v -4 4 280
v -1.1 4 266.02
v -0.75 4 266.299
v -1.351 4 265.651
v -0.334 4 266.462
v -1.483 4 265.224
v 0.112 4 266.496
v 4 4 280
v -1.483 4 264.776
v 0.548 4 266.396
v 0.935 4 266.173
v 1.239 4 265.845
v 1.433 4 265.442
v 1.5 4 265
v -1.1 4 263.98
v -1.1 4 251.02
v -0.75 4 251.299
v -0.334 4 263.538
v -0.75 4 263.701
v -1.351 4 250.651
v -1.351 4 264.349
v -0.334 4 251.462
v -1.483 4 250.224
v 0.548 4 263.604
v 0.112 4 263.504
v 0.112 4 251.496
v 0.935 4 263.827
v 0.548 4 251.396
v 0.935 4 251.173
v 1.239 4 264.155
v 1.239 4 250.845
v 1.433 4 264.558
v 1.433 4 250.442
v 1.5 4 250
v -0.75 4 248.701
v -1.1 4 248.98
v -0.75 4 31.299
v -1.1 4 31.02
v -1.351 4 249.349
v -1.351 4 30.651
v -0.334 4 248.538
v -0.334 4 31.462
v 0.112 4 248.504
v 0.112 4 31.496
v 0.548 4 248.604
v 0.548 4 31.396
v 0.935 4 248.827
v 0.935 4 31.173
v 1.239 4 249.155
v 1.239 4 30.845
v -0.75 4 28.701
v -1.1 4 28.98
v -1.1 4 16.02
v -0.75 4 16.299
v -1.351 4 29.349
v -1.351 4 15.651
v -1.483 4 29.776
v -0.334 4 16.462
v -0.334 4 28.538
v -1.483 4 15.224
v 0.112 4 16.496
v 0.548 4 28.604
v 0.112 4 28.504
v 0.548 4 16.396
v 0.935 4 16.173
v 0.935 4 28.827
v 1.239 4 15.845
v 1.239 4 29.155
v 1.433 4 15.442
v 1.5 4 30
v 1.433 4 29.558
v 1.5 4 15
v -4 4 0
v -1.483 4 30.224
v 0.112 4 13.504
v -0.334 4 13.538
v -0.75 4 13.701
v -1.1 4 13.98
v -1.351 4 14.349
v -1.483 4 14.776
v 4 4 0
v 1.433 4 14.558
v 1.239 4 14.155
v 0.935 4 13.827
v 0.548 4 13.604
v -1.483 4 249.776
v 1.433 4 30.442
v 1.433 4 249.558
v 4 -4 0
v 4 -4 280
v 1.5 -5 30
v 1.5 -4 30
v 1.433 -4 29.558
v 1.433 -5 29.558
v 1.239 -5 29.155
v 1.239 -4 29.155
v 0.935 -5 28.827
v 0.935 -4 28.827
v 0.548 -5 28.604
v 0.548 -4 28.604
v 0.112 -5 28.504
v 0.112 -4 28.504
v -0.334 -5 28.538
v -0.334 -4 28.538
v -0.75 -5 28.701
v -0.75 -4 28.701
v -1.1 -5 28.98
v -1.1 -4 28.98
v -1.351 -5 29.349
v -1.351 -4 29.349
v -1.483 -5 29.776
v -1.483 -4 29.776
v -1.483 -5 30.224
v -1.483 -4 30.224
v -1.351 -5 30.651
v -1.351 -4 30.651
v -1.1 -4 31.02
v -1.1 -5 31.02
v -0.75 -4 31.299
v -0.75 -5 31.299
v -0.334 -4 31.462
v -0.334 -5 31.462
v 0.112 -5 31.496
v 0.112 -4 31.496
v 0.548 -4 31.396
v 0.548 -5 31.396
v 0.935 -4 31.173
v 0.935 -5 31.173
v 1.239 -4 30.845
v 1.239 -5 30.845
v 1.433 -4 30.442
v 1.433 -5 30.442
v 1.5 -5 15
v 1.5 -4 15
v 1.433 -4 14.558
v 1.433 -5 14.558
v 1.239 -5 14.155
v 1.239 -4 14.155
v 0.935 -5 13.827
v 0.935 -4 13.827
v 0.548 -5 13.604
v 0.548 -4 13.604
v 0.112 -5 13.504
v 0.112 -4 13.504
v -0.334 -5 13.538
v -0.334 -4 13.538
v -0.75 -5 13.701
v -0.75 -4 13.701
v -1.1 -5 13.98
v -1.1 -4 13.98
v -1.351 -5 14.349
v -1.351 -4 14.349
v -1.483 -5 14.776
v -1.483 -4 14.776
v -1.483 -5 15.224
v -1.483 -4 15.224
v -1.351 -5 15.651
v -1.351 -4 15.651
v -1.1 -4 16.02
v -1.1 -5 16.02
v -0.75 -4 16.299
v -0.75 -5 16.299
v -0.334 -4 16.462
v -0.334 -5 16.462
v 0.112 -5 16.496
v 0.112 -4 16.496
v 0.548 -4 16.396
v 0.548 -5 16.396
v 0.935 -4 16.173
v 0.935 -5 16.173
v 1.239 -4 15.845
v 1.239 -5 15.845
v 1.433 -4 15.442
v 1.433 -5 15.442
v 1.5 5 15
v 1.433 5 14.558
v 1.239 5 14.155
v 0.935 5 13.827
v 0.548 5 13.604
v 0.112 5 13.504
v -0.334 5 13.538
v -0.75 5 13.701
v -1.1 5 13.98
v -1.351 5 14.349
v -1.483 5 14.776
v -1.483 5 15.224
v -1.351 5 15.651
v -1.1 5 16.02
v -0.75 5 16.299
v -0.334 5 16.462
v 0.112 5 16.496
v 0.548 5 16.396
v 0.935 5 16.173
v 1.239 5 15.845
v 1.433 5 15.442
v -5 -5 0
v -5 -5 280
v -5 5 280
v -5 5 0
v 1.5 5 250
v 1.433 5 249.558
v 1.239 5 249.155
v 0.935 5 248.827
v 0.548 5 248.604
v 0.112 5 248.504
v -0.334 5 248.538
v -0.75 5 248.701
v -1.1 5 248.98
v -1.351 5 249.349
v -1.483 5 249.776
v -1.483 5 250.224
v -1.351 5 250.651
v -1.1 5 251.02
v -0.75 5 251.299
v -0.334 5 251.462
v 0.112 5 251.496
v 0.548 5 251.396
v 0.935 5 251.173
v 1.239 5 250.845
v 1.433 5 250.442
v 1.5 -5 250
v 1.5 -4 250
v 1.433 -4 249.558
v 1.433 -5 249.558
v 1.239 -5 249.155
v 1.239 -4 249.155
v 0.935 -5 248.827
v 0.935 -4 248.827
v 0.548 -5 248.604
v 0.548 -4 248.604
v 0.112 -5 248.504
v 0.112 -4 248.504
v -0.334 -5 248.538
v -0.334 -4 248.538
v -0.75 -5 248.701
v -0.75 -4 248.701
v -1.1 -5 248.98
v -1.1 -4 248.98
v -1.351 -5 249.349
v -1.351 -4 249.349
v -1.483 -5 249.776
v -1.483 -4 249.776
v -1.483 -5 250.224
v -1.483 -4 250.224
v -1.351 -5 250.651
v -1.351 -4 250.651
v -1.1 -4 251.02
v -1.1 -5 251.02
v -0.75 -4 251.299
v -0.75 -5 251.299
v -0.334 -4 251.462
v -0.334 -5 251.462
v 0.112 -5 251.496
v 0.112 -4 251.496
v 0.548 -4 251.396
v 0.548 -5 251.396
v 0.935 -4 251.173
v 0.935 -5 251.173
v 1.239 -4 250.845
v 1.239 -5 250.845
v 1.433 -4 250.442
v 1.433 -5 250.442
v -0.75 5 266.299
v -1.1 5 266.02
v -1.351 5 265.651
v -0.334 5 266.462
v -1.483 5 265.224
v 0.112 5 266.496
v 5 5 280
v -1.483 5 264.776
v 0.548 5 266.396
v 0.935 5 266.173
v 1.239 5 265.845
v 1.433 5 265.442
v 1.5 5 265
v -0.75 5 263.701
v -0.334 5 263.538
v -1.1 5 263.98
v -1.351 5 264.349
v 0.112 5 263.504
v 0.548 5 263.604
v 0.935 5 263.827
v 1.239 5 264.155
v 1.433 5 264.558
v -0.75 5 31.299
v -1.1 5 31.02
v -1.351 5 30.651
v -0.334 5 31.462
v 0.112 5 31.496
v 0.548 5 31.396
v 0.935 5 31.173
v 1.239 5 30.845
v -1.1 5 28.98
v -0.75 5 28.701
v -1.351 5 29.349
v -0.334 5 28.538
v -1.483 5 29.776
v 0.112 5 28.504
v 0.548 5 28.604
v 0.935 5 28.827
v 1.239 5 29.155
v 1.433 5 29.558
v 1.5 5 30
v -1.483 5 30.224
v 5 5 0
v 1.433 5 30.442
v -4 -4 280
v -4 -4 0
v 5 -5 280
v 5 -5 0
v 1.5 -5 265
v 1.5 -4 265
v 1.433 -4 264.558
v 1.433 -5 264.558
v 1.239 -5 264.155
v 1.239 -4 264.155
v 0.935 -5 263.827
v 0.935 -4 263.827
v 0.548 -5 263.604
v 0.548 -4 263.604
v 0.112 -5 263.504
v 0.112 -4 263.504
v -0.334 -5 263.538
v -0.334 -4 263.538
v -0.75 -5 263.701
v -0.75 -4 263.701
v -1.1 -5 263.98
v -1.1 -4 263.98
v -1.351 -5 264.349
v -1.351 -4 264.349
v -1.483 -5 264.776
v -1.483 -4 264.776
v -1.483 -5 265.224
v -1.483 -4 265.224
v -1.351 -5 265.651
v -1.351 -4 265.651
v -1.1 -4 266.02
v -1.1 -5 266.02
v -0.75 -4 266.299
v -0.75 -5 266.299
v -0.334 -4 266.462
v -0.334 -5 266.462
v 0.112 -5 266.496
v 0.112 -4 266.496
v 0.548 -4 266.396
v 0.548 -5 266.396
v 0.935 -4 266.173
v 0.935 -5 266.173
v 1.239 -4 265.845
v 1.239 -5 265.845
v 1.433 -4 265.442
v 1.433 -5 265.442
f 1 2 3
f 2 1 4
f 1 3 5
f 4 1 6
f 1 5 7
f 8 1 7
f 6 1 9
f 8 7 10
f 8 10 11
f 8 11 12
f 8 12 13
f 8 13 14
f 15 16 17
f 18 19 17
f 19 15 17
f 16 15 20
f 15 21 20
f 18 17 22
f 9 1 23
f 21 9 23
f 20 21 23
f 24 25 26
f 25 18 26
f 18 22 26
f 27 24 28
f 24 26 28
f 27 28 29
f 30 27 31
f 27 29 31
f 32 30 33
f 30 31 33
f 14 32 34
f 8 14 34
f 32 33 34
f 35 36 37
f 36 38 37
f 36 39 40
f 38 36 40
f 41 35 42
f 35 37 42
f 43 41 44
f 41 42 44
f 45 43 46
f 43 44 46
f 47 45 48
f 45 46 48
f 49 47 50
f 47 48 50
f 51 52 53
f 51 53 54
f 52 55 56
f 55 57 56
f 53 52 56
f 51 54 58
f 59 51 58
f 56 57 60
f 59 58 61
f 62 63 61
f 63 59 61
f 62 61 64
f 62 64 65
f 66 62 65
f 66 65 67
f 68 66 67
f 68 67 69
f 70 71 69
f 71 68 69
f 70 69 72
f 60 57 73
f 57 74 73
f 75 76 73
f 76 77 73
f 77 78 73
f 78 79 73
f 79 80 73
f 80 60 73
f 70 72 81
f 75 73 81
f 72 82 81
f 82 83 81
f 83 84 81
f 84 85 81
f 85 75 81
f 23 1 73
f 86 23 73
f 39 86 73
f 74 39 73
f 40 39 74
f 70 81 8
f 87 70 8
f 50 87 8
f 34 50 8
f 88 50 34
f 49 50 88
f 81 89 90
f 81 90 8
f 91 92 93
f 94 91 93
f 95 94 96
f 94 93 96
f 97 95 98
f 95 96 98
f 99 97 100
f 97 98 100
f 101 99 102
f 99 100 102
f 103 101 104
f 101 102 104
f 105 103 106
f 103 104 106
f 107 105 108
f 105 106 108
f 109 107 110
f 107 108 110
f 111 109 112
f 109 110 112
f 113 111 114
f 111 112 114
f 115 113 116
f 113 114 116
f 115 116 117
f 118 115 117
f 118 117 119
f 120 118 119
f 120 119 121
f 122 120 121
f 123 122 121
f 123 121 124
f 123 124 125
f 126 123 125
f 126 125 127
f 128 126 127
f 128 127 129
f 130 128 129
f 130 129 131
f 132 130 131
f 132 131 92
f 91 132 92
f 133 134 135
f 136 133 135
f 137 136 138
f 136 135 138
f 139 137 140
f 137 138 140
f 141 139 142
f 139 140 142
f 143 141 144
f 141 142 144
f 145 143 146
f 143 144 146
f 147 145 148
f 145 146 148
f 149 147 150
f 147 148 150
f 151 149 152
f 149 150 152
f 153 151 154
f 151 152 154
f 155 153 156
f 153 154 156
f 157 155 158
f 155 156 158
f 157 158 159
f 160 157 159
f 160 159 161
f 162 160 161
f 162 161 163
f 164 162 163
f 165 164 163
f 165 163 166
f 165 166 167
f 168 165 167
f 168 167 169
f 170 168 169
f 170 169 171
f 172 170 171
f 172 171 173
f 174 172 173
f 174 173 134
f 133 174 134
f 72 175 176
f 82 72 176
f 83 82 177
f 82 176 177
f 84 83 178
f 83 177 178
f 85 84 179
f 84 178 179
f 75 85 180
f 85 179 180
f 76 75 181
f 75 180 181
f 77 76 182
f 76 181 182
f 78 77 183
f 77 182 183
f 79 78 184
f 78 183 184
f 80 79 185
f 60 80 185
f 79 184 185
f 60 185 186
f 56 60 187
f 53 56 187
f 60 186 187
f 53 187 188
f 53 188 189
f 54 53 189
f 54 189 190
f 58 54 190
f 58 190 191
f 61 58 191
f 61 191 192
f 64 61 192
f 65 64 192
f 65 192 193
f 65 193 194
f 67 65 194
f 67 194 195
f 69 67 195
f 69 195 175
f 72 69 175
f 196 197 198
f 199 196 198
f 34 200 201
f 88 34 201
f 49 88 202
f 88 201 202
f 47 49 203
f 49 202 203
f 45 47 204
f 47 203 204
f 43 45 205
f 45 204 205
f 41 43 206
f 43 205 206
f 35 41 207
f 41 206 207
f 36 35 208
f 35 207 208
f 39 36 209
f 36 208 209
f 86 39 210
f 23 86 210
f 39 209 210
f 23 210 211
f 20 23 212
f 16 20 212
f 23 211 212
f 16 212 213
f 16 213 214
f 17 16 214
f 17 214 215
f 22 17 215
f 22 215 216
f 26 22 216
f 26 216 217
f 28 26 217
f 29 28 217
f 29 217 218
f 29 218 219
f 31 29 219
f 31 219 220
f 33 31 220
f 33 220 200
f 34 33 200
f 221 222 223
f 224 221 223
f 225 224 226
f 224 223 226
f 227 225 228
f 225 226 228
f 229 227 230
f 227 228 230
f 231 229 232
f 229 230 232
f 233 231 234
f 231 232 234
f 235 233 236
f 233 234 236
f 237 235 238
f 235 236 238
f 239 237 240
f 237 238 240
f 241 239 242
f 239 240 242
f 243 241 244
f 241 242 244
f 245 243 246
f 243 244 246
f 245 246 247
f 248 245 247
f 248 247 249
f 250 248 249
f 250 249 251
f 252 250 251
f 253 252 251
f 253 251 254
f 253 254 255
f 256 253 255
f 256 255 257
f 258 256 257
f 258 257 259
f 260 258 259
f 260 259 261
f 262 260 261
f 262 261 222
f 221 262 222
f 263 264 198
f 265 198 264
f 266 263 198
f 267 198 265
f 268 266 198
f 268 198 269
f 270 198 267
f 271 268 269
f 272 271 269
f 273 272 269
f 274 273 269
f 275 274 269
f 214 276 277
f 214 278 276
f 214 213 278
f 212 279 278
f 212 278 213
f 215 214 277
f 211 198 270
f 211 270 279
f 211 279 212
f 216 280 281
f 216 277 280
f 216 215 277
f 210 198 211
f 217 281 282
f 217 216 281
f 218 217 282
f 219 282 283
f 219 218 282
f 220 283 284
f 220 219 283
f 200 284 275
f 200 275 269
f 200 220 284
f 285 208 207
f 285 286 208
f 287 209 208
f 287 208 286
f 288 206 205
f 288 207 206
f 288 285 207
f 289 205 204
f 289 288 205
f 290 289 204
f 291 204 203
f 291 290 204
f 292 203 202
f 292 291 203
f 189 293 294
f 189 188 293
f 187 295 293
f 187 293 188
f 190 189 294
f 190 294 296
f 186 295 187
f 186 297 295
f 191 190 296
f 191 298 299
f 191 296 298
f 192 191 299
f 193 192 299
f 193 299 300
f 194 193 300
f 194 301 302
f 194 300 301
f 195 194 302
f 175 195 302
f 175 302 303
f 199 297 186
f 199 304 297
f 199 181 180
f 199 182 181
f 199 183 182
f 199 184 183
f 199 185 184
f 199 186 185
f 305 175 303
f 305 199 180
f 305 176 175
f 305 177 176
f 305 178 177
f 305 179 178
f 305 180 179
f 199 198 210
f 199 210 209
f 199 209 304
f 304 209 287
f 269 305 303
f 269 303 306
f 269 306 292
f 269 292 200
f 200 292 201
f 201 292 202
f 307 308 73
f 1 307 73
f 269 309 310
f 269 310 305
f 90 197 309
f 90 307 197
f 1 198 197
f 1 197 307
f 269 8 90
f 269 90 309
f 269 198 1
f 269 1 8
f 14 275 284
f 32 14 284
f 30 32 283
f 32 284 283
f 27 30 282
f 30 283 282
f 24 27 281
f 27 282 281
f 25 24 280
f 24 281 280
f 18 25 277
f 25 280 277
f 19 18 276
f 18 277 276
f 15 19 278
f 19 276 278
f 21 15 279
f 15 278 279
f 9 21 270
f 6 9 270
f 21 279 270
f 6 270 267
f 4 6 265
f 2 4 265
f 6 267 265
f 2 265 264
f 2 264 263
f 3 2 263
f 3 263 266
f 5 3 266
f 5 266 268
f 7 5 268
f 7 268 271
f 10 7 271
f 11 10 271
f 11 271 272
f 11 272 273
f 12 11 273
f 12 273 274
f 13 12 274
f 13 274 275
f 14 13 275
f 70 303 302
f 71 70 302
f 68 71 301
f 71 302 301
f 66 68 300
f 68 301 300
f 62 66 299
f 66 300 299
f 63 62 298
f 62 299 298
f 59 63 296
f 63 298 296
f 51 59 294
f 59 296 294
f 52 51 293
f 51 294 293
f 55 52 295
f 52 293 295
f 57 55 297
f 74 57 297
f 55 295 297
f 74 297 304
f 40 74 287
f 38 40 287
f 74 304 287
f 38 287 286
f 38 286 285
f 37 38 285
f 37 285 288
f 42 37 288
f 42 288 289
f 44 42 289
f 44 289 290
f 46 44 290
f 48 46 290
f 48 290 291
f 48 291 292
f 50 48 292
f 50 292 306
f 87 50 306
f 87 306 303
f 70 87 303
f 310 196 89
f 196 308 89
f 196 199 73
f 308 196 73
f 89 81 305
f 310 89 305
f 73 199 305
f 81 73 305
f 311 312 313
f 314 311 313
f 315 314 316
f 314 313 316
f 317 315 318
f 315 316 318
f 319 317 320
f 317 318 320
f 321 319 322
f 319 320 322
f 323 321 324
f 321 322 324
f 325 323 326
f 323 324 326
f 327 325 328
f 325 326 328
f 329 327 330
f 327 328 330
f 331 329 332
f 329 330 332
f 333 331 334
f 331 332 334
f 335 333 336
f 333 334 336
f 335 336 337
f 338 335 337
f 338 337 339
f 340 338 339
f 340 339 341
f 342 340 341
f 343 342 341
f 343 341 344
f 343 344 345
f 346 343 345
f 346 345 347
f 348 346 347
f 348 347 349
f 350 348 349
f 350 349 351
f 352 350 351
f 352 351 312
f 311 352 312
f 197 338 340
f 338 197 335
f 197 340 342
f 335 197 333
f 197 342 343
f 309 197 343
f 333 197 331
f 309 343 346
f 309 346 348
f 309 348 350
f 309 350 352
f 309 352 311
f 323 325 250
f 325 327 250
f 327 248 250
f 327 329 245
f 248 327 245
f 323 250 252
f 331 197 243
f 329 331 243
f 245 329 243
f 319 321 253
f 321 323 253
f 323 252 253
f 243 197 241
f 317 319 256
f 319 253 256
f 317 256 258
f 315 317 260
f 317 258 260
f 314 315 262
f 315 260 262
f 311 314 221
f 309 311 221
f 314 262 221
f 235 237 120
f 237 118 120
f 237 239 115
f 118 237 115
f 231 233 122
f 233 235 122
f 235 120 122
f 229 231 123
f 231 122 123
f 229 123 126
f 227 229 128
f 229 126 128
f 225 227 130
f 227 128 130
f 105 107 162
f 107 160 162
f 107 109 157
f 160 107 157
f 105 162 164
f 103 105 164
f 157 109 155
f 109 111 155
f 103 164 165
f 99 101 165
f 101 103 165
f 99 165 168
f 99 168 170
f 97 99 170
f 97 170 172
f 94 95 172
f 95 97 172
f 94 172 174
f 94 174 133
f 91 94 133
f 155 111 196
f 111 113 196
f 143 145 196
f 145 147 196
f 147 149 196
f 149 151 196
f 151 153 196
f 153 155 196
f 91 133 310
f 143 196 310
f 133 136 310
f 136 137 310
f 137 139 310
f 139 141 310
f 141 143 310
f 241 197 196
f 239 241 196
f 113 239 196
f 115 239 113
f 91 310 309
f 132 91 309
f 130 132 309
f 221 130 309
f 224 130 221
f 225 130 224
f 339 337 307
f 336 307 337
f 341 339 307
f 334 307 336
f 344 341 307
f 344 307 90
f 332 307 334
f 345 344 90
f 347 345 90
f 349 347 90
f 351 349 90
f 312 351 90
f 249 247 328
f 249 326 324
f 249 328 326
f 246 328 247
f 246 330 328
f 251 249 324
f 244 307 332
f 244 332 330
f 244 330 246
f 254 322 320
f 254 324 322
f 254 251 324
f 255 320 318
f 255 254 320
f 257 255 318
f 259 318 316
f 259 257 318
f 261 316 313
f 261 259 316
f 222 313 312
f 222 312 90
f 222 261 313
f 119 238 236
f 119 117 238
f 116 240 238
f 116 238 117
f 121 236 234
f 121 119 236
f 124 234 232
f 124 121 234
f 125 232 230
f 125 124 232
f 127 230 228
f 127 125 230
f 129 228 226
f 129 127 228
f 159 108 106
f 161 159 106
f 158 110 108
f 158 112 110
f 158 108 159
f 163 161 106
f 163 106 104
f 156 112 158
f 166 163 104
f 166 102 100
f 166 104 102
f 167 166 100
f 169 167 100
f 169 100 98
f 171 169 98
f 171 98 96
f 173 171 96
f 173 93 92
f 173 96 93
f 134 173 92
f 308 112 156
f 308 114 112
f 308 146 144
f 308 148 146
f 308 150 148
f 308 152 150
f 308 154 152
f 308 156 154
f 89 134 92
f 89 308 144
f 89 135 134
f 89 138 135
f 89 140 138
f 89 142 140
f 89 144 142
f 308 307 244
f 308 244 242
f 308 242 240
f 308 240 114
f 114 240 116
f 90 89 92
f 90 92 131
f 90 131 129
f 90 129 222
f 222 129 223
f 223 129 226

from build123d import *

# Parameters (mm, degrees)
SKETCH2_W           = 10
SKETCH2_H           = 10
SKETCH2_W_2         = 8
SKETCH2_H_2         = 8
BOSS_EXTRUDE1_DEPTH = 280
SKETCH3_R           = 1.5
CUT_EXTRUDE1_DEPTH  = 28


with BuildPart() as part:
    # Sketch2 → Boss-Extrude1 (new body)
    with BuildSketch(Plane.XY):
        Rectangle(SKETCH2_W, SKETCH2_H)
        Rectangle(SKETCH2_W_2, SKETCH2_H_2, mode=Mode.SUBTRACT)
    extrude(amount=BOSS_EXTRUDE1_DEPTH)

    # Sketch3 → Cut-Extrude1 (cut)
    with BuildSketch(Plane(origin=(0, 5, 0), x_dir=(1, 0, 0), z_dir=(0, 1, 0))):
        with Locations((0, -15)):
            Circle(SKETCH3_R)
        with Locations((0, -30)):
            Circle(SKETCH3_R)
        with Locations((0, -265)):
            Circle(SKETCH3_R)
        with Locations((0, -250)):
            Circle(SKETCH3_R)
    extrude(amount=-CUT_EXTRUDE1_DEPTH, mode=Mode.SUBTRACT)


solid = part.part
